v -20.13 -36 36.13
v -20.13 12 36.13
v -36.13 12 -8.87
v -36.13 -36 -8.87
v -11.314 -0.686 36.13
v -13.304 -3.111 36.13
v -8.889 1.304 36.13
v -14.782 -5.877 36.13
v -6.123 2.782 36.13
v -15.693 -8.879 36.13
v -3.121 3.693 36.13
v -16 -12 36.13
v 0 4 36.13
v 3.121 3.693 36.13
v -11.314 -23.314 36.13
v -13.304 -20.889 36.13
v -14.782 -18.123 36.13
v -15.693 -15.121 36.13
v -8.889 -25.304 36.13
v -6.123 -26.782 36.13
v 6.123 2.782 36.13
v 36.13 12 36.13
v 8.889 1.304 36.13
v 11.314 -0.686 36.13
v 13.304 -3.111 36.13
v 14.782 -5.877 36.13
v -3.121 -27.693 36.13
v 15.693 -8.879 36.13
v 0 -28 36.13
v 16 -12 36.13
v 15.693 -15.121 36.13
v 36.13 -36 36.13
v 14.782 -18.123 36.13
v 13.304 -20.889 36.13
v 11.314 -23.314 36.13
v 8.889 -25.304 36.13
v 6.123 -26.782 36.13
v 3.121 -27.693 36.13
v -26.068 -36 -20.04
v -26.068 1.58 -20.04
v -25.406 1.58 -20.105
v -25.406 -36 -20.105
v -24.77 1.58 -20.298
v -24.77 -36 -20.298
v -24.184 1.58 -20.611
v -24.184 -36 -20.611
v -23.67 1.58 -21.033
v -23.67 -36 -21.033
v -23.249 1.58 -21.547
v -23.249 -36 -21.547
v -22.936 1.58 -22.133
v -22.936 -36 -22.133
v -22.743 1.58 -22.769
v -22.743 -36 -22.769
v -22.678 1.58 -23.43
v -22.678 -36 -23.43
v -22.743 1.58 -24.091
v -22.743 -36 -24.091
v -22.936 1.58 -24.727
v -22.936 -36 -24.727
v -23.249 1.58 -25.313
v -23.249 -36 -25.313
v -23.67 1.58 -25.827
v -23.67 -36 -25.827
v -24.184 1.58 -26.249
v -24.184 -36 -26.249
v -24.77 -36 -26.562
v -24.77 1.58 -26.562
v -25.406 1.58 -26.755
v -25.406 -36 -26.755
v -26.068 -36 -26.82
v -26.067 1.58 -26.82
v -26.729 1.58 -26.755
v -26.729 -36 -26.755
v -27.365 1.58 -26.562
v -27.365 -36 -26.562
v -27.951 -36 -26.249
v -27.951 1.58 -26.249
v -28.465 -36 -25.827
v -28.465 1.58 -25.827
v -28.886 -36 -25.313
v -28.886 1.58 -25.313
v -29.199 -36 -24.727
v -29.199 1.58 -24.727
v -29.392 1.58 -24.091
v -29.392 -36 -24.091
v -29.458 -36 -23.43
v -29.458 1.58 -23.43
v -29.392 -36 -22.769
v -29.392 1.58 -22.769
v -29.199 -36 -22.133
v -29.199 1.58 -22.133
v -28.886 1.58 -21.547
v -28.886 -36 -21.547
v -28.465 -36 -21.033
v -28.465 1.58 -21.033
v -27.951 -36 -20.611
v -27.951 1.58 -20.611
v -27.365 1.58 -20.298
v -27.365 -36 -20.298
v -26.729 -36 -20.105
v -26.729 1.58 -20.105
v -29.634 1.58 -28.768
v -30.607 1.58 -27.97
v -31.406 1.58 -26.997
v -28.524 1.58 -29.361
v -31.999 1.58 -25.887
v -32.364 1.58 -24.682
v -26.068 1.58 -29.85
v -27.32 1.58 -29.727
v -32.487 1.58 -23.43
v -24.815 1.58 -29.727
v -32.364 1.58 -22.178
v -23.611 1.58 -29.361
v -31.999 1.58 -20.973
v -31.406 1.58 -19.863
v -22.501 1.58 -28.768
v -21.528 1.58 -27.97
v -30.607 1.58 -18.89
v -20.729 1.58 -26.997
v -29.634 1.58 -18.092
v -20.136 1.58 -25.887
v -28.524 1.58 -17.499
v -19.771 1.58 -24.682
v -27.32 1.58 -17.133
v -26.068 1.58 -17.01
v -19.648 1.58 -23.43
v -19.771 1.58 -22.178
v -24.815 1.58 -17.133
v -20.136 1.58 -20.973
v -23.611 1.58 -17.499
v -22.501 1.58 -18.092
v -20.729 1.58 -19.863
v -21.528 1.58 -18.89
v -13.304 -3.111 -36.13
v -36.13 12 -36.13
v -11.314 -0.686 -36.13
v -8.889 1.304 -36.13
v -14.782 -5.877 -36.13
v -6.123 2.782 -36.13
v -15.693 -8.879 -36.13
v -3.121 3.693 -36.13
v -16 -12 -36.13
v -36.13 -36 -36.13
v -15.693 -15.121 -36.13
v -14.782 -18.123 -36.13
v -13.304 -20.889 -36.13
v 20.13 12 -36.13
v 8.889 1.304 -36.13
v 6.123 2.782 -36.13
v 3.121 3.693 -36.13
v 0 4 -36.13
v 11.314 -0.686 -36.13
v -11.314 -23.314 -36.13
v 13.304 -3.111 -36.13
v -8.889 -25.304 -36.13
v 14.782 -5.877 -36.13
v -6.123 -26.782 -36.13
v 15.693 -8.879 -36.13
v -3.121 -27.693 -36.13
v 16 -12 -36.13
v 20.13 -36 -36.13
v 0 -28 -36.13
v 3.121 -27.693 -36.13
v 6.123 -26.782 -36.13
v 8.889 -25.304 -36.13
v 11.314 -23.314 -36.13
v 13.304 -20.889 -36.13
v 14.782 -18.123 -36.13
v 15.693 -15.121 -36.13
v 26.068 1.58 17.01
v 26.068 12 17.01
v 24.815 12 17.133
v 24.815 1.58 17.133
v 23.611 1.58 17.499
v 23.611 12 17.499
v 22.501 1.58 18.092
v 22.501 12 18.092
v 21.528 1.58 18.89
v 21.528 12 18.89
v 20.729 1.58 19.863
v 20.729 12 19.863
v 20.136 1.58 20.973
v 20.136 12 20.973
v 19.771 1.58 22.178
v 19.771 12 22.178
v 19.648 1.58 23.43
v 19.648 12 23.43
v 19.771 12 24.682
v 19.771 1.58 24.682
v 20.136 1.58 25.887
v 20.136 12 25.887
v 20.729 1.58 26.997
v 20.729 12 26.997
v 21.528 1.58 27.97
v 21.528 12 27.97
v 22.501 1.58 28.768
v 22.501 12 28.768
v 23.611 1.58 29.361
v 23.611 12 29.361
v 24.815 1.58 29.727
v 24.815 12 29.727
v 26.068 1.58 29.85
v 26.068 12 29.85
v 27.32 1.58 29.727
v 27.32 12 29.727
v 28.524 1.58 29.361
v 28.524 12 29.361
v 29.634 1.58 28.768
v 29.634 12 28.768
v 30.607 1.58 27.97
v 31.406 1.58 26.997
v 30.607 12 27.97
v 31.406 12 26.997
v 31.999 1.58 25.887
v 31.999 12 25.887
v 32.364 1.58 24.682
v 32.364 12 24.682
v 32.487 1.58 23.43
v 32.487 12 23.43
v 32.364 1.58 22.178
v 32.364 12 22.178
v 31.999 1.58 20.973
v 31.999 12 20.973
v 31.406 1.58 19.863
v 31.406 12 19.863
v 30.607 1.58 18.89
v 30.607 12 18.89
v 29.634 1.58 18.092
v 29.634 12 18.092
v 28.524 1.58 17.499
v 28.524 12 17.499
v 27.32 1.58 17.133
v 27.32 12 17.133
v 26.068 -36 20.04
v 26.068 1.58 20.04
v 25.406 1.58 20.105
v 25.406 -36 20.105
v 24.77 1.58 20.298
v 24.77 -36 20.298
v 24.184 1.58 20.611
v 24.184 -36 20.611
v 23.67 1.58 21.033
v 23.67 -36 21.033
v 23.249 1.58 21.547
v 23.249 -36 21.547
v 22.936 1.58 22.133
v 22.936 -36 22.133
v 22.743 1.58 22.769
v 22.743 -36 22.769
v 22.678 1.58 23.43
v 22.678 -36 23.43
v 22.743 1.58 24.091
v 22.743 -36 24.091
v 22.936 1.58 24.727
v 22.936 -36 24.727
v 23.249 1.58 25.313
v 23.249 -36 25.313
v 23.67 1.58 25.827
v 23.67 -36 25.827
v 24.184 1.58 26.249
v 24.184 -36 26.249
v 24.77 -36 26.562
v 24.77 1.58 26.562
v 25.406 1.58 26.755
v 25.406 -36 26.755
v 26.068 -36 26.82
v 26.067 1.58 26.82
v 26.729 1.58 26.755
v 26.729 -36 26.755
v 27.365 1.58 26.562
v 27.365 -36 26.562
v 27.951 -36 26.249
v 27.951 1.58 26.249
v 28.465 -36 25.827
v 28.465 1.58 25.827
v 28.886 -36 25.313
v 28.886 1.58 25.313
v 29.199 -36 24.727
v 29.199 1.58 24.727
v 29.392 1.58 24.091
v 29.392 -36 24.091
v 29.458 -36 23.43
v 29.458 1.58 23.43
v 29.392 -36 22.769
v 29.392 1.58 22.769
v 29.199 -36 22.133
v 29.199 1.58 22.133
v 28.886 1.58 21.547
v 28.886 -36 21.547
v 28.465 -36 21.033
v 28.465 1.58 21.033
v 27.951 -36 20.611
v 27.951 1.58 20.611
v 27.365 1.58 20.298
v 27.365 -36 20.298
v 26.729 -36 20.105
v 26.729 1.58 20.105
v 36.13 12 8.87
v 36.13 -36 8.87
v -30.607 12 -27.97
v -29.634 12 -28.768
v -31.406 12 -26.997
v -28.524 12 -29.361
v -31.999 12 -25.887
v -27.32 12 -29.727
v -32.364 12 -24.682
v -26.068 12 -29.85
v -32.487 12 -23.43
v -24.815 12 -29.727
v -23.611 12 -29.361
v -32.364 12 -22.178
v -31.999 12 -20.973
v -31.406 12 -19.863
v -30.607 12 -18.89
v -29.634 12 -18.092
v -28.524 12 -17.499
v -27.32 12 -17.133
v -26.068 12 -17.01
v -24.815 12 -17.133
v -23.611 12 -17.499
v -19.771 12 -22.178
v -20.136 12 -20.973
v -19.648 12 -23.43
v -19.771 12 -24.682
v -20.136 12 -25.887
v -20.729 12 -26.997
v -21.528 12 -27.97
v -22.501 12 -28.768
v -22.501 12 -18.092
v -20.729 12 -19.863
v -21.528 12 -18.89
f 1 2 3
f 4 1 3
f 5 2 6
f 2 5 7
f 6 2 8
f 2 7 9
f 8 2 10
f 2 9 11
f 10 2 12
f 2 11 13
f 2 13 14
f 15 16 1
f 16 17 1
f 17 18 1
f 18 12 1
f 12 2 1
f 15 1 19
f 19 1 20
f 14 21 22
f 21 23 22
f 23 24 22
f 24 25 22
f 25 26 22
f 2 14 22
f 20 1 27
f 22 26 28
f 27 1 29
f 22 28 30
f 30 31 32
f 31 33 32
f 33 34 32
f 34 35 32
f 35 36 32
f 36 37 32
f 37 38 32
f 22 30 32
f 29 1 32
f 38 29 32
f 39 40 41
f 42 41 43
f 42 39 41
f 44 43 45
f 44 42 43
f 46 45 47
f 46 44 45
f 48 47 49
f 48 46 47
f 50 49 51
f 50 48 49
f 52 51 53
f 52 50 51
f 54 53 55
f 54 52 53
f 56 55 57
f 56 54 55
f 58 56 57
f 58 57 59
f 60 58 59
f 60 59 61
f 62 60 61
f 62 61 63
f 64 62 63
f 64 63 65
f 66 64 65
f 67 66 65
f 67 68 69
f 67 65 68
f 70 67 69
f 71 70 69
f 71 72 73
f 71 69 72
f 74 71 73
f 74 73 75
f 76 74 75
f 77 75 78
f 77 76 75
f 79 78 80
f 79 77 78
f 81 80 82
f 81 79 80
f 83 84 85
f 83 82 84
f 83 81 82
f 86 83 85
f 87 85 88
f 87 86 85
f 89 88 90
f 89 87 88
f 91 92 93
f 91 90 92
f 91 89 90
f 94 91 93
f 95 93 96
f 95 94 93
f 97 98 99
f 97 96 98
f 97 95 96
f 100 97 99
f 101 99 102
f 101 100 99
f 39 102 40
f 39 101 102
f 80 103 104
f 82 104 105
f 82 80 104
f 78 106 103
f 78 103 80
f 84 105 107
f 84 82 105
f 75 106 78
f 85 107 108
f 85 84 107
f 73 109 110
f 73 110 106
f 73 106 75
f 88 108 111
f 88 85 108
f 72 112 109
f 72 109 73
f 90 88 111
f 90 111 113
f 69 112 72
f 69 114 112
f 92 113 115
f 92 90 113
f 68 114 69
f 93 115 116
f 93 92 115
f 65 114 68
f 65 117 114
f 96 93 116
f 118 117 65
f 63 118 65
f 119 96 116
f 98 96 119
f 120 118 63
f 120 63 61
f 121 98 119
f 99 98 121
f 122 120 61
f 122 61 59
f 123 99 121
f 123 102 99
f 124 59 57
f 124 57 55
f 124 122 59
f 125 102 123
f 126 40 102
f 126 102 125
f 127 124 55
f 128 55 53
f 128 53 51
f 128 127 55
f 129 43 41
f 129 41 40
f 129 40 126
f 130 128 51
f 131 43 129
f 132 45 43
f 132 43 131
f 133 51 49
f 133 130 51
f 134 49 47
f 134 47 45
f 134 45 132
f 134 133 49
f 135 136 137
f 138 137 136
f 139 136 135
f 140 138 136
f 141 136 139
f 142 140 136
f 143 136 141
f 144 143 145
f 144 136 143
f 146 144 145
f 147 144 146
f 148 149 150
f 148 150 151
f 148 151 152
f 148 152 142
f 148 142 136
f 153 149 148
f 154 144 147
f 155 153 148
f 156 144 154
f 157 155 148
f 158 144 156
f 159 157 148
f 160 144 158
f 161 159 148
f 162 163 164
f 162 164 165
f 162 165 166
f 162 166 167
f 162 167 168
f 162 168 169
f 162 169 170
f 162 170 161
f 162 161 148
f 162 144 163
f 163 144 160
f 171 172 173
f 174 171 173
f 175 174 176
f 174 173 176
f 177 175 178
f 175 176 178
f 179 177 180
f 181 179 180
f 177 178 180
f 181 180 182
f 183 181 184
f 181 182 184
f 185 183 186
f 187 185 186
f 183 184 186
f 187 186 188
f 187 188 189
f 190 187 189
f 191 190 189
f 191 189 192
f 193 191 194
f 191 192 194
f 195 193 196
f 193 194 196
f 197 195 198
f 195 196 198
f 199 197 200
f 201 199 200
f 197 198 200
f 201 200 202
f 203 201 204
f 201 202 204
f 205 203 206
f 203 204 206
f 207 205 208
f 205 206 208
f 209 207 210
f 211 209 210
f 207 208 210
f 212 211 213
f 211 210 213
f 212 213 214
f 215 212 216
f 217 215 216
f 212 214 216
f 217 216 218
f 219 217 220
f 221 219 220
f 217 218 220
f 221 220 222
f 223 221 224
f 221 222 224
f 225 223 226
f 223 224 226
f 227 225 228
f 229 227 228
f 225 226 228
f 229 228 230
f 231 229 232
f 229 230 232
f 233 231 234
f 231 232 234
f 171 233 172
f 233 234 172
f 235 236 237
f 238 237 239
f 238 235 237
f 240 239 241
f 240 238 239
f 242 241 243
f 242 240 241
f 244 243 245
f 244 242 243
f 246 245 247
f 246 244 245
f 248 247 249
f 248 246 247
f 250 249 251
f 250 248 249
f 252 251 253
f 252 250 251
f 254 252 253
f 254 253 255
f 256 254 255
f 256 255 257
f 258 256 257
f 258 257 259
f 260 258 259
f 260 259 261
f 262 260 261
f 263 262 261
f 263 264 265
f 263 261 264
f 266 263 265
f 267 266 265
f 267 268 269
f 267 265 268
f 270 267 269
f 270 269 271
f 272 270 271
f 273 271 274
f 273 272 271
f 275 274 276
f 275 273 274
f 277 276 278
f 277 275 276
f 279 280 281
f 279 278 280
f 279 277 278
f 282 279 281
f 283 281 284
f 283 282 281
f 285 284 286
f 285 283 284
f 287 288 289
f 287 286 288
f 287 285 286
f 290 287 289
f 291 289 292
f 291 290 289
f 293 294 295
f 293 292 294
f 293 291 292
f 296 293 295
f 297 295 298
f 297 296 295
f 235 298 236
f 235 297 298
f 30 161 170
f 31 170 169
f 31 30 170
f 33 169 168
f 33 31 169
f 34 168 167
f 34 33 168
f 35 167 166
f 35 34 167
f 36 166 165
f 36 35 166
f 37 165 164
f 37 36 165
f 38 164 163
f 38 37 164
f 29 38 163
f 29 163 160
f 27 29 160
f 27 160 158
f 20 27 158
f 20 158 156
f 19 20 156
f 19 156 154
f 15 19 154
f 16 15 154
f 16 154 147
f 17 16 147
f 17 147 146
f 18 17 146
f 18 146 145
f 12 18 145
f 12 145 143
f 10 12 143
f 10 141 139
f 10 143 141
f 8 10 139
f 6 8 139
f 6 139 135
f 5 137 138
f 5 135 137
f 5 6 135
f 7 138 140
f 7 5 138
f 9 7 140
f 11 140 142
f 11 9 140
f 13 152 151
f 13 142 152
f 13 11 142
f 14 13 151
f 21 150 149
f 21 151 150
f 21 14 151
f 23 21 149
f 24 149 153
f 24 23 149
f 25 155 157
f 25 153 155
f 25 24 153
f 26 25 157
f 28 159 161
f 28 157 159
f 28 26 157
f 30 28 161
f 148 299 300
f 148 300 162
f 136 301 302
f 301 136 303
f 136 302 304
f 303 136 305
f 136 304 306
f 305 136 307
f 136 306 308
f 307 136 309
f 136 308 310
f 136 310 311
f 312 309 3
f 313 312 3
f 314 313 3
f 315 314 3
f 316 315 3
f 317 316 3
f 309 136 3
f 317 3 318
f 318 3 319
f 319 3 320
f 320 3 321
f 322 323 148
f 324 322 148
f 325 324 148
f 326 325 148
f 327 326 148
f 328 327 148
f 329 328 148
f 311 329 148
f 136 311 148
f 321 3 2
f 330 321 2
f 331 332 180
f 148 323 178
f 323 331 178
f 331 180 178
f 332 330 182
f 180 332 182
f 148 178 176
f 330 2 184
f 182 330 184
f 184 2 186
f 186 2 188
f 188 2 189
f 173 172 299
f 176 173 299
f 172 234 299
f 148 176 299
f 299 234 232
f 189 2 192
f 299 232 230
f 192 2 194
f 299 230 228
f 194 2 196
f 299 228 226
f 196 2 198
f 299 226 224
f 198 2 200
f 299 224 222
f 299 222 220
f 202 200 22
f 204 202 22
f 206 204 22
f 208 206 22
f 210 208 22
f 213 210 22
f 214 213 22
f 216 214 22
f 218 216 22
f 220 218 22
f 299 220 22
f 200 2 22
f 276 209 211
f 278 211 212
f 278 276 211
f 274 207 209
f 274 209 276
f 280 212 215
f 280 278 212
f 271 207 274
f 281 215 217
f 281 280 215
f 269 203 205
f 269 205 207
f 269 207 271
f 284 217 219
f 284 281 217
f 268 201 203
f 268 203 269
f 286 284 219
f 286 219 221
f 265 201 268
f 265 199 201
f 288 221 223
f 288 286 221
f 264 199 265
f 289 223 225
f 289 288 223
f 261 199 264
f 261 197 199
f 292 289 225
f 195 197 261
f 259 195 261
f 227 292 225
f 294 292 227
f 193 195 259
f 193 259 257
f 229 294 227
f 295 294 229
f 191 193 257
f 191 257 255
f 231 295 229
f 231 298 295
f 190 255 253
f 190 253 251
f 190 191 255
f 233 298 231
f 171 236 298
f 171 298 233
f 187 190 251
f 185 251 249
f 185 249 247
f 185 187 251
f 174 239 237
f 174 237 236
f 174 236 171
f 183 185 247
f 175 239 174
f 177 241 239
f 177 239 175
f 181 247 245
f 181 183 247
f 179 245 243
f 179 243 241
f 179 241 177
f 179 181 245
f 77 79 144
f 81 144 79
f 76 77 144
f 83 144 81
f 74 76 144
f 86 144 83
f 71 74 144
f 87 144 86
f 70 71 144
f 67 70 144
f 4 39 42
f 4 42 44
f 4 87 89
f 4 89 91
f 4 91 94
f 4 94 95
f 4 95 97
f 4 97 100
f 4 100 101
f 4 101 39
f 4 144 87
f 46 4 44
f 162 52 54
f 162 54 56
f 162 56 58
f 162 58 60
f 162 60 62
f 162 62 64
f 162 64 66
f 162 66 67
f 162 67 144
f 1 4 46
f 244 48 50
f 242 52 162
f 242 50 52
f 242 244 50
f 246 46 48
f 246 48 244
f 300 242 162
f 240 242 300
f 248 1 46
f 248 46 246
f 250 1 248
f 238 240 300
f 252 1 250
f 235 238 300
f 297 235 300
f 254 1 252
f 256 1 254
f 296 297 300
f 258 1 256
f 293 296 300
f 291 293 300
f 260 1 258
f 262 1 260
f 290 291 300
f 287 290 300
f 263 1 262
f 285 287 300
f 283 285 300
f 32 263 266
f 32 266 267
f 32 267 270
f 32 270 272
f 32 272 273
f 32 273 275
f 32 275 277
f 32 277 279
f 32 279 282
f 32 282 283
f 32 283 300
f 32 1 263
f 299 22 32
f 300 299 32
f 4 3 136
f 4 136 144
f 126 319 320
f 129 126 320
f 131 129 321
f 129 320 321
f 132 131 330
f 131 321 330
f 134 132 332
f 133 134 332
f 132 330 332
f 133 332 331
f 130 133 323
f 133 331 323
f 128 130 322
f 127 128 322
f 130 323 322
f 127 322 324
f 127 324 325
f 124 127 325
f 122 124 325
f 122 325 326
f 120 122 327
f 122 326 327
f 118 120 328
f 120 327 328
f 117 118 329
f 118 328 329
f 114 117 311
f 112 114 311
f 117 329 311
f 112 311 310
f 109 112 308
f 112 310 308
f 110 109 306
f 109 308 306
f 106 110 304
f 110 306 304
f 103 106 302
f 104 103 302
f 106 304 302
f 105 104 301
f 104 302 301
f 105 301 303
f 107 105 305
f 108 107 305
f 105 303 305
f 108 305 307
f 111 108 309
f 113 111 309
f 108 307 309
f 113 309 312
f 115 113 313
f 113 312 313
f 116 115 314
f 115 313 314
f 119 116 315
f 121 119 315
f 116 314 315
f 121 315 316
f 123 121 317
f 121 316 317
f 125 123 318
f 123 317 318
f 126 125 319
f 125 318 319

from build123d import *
from build123d.topology import SkipClean

# Parameters (mm, degrees)
SKETCH1_W           = 72.26
SKETCH1_H           = 24
BOSS_EXTRUDE1_DEPTH = 36.13
CUT_EXTRUDE1_DEPTH  = 82.675482857
SKETCH3_R           = 3.39
CUT_EXTRUDE2_DEPTH  = 57.451340108
SKETCH4_R           = 6.42
CUT_EXTRUDE3_DEPTH  = 10.42
CUT_EXTRUDE4_DEPTH  = 71.105305077


with BuildPart() as part:
    # Sketch1 → Boss-Extrude1 (new, symmetric)
    with BuildSketch(Plane.XY):
        Rectangle(SKETCH1_W, SKETCH1_H)
    boss_extrude1 = extrude(amount=BOSS_EXTRUDE1_DEPTH, both=True)

    # Sketch2 → Cut-Extrude1 (cut, through all)
    with BuildSketch(Plane.XY.offset(36.13)):
        with BuildLine():
            Line((-16, -12), (16, -12))
            ThreePointArc((16, -12), (0, 4), (-16, -12))
        make_face()
    cut_extrude1 = extrude(amount=-CUT_EXTRUDE1_DEPTH, mode=Mode.SUBTRACT)

    # Sketch3 → Cut-Extrude2 (cut, through all)
    with BuildSketch(Plane(origin=(0, 12, 0), x_dir=(1, 0, 0), z_dir=(0, 1, 0))):
        with Locations((-26.0675, 23.43)):
            Circle(SKETCH3_R)
        with Locations((26.0675, -23.43)):
            Circle(SKETCH3_R)
    cut_extrude2 = extrude(amount=-CUT_EXTRUDE2_DEPTH, mode=Mode.SUBTRACT)

    # Mirror2: Boss-Extrude1, Cut-Extrude1, Cut-Extrude2 across plane
    with SkipClean():  # the faces are left unmerged after this step: merging them gives an invalid solid
        add(boss_extrude1.mirror(Plane(origin=(-36.13, -12, 36.13), x_dir=(0, 0, 1), z_dir=(0, 1, 0))))
        add(cut_extrude1.mirror(Plane(origin=(-36.13, -12, 36.13), x_dir=(0, 0, 1), z_dir=(0, 1, 0))), mode=Mode.SUBTRACT)
        add(cut_extrude2.mirror(Plane(origin=(-36.13, -12, 36.13), x_dir=(0, 0, 1), z_dir=(0, 1, 0))), mode=Mode.SUBTRACT)
    add(part.part.scale(1), mode=Mode.REPLACE)  # the faces are merged on a copy

    # Sketch4 → Cut-Extrude3 (cut)
    with BuildSketch(Plane(origin=(0, 12, 0), x_dir=(1, 0, 0), z_dir=(0, 1, 0))):
        with Locations((-26.0675, 23.43)):
            Circle(SKETCH4_R)
        with Locations((26.0675, -23.43)):
            Circle(SKETCH4_R)
    extrude(amount=-CUT_EXTRUDE3_DEPTH, mode=Mode.SUBTRACT)

    # Sketch5 → Cut-Extrude4 (cut, through all)
    with BuildSketch(Plane(origin=(0, 12, 0), x_dir=(1, 0, 0), z_dir=(0, 1, 0))):
        Polygon((-20.13, -36.13), (-36.13, 8.87), (-36.13, -36.13), align=None)
        Polygon((36.13, 36.13), (36.13, -8.87), (20.13, 36.13), align=None)
    extrude(amount=-CUT_EXTRUDE4_DEPTH, mode=Mode.SUBTRACT)


solid = part.part
